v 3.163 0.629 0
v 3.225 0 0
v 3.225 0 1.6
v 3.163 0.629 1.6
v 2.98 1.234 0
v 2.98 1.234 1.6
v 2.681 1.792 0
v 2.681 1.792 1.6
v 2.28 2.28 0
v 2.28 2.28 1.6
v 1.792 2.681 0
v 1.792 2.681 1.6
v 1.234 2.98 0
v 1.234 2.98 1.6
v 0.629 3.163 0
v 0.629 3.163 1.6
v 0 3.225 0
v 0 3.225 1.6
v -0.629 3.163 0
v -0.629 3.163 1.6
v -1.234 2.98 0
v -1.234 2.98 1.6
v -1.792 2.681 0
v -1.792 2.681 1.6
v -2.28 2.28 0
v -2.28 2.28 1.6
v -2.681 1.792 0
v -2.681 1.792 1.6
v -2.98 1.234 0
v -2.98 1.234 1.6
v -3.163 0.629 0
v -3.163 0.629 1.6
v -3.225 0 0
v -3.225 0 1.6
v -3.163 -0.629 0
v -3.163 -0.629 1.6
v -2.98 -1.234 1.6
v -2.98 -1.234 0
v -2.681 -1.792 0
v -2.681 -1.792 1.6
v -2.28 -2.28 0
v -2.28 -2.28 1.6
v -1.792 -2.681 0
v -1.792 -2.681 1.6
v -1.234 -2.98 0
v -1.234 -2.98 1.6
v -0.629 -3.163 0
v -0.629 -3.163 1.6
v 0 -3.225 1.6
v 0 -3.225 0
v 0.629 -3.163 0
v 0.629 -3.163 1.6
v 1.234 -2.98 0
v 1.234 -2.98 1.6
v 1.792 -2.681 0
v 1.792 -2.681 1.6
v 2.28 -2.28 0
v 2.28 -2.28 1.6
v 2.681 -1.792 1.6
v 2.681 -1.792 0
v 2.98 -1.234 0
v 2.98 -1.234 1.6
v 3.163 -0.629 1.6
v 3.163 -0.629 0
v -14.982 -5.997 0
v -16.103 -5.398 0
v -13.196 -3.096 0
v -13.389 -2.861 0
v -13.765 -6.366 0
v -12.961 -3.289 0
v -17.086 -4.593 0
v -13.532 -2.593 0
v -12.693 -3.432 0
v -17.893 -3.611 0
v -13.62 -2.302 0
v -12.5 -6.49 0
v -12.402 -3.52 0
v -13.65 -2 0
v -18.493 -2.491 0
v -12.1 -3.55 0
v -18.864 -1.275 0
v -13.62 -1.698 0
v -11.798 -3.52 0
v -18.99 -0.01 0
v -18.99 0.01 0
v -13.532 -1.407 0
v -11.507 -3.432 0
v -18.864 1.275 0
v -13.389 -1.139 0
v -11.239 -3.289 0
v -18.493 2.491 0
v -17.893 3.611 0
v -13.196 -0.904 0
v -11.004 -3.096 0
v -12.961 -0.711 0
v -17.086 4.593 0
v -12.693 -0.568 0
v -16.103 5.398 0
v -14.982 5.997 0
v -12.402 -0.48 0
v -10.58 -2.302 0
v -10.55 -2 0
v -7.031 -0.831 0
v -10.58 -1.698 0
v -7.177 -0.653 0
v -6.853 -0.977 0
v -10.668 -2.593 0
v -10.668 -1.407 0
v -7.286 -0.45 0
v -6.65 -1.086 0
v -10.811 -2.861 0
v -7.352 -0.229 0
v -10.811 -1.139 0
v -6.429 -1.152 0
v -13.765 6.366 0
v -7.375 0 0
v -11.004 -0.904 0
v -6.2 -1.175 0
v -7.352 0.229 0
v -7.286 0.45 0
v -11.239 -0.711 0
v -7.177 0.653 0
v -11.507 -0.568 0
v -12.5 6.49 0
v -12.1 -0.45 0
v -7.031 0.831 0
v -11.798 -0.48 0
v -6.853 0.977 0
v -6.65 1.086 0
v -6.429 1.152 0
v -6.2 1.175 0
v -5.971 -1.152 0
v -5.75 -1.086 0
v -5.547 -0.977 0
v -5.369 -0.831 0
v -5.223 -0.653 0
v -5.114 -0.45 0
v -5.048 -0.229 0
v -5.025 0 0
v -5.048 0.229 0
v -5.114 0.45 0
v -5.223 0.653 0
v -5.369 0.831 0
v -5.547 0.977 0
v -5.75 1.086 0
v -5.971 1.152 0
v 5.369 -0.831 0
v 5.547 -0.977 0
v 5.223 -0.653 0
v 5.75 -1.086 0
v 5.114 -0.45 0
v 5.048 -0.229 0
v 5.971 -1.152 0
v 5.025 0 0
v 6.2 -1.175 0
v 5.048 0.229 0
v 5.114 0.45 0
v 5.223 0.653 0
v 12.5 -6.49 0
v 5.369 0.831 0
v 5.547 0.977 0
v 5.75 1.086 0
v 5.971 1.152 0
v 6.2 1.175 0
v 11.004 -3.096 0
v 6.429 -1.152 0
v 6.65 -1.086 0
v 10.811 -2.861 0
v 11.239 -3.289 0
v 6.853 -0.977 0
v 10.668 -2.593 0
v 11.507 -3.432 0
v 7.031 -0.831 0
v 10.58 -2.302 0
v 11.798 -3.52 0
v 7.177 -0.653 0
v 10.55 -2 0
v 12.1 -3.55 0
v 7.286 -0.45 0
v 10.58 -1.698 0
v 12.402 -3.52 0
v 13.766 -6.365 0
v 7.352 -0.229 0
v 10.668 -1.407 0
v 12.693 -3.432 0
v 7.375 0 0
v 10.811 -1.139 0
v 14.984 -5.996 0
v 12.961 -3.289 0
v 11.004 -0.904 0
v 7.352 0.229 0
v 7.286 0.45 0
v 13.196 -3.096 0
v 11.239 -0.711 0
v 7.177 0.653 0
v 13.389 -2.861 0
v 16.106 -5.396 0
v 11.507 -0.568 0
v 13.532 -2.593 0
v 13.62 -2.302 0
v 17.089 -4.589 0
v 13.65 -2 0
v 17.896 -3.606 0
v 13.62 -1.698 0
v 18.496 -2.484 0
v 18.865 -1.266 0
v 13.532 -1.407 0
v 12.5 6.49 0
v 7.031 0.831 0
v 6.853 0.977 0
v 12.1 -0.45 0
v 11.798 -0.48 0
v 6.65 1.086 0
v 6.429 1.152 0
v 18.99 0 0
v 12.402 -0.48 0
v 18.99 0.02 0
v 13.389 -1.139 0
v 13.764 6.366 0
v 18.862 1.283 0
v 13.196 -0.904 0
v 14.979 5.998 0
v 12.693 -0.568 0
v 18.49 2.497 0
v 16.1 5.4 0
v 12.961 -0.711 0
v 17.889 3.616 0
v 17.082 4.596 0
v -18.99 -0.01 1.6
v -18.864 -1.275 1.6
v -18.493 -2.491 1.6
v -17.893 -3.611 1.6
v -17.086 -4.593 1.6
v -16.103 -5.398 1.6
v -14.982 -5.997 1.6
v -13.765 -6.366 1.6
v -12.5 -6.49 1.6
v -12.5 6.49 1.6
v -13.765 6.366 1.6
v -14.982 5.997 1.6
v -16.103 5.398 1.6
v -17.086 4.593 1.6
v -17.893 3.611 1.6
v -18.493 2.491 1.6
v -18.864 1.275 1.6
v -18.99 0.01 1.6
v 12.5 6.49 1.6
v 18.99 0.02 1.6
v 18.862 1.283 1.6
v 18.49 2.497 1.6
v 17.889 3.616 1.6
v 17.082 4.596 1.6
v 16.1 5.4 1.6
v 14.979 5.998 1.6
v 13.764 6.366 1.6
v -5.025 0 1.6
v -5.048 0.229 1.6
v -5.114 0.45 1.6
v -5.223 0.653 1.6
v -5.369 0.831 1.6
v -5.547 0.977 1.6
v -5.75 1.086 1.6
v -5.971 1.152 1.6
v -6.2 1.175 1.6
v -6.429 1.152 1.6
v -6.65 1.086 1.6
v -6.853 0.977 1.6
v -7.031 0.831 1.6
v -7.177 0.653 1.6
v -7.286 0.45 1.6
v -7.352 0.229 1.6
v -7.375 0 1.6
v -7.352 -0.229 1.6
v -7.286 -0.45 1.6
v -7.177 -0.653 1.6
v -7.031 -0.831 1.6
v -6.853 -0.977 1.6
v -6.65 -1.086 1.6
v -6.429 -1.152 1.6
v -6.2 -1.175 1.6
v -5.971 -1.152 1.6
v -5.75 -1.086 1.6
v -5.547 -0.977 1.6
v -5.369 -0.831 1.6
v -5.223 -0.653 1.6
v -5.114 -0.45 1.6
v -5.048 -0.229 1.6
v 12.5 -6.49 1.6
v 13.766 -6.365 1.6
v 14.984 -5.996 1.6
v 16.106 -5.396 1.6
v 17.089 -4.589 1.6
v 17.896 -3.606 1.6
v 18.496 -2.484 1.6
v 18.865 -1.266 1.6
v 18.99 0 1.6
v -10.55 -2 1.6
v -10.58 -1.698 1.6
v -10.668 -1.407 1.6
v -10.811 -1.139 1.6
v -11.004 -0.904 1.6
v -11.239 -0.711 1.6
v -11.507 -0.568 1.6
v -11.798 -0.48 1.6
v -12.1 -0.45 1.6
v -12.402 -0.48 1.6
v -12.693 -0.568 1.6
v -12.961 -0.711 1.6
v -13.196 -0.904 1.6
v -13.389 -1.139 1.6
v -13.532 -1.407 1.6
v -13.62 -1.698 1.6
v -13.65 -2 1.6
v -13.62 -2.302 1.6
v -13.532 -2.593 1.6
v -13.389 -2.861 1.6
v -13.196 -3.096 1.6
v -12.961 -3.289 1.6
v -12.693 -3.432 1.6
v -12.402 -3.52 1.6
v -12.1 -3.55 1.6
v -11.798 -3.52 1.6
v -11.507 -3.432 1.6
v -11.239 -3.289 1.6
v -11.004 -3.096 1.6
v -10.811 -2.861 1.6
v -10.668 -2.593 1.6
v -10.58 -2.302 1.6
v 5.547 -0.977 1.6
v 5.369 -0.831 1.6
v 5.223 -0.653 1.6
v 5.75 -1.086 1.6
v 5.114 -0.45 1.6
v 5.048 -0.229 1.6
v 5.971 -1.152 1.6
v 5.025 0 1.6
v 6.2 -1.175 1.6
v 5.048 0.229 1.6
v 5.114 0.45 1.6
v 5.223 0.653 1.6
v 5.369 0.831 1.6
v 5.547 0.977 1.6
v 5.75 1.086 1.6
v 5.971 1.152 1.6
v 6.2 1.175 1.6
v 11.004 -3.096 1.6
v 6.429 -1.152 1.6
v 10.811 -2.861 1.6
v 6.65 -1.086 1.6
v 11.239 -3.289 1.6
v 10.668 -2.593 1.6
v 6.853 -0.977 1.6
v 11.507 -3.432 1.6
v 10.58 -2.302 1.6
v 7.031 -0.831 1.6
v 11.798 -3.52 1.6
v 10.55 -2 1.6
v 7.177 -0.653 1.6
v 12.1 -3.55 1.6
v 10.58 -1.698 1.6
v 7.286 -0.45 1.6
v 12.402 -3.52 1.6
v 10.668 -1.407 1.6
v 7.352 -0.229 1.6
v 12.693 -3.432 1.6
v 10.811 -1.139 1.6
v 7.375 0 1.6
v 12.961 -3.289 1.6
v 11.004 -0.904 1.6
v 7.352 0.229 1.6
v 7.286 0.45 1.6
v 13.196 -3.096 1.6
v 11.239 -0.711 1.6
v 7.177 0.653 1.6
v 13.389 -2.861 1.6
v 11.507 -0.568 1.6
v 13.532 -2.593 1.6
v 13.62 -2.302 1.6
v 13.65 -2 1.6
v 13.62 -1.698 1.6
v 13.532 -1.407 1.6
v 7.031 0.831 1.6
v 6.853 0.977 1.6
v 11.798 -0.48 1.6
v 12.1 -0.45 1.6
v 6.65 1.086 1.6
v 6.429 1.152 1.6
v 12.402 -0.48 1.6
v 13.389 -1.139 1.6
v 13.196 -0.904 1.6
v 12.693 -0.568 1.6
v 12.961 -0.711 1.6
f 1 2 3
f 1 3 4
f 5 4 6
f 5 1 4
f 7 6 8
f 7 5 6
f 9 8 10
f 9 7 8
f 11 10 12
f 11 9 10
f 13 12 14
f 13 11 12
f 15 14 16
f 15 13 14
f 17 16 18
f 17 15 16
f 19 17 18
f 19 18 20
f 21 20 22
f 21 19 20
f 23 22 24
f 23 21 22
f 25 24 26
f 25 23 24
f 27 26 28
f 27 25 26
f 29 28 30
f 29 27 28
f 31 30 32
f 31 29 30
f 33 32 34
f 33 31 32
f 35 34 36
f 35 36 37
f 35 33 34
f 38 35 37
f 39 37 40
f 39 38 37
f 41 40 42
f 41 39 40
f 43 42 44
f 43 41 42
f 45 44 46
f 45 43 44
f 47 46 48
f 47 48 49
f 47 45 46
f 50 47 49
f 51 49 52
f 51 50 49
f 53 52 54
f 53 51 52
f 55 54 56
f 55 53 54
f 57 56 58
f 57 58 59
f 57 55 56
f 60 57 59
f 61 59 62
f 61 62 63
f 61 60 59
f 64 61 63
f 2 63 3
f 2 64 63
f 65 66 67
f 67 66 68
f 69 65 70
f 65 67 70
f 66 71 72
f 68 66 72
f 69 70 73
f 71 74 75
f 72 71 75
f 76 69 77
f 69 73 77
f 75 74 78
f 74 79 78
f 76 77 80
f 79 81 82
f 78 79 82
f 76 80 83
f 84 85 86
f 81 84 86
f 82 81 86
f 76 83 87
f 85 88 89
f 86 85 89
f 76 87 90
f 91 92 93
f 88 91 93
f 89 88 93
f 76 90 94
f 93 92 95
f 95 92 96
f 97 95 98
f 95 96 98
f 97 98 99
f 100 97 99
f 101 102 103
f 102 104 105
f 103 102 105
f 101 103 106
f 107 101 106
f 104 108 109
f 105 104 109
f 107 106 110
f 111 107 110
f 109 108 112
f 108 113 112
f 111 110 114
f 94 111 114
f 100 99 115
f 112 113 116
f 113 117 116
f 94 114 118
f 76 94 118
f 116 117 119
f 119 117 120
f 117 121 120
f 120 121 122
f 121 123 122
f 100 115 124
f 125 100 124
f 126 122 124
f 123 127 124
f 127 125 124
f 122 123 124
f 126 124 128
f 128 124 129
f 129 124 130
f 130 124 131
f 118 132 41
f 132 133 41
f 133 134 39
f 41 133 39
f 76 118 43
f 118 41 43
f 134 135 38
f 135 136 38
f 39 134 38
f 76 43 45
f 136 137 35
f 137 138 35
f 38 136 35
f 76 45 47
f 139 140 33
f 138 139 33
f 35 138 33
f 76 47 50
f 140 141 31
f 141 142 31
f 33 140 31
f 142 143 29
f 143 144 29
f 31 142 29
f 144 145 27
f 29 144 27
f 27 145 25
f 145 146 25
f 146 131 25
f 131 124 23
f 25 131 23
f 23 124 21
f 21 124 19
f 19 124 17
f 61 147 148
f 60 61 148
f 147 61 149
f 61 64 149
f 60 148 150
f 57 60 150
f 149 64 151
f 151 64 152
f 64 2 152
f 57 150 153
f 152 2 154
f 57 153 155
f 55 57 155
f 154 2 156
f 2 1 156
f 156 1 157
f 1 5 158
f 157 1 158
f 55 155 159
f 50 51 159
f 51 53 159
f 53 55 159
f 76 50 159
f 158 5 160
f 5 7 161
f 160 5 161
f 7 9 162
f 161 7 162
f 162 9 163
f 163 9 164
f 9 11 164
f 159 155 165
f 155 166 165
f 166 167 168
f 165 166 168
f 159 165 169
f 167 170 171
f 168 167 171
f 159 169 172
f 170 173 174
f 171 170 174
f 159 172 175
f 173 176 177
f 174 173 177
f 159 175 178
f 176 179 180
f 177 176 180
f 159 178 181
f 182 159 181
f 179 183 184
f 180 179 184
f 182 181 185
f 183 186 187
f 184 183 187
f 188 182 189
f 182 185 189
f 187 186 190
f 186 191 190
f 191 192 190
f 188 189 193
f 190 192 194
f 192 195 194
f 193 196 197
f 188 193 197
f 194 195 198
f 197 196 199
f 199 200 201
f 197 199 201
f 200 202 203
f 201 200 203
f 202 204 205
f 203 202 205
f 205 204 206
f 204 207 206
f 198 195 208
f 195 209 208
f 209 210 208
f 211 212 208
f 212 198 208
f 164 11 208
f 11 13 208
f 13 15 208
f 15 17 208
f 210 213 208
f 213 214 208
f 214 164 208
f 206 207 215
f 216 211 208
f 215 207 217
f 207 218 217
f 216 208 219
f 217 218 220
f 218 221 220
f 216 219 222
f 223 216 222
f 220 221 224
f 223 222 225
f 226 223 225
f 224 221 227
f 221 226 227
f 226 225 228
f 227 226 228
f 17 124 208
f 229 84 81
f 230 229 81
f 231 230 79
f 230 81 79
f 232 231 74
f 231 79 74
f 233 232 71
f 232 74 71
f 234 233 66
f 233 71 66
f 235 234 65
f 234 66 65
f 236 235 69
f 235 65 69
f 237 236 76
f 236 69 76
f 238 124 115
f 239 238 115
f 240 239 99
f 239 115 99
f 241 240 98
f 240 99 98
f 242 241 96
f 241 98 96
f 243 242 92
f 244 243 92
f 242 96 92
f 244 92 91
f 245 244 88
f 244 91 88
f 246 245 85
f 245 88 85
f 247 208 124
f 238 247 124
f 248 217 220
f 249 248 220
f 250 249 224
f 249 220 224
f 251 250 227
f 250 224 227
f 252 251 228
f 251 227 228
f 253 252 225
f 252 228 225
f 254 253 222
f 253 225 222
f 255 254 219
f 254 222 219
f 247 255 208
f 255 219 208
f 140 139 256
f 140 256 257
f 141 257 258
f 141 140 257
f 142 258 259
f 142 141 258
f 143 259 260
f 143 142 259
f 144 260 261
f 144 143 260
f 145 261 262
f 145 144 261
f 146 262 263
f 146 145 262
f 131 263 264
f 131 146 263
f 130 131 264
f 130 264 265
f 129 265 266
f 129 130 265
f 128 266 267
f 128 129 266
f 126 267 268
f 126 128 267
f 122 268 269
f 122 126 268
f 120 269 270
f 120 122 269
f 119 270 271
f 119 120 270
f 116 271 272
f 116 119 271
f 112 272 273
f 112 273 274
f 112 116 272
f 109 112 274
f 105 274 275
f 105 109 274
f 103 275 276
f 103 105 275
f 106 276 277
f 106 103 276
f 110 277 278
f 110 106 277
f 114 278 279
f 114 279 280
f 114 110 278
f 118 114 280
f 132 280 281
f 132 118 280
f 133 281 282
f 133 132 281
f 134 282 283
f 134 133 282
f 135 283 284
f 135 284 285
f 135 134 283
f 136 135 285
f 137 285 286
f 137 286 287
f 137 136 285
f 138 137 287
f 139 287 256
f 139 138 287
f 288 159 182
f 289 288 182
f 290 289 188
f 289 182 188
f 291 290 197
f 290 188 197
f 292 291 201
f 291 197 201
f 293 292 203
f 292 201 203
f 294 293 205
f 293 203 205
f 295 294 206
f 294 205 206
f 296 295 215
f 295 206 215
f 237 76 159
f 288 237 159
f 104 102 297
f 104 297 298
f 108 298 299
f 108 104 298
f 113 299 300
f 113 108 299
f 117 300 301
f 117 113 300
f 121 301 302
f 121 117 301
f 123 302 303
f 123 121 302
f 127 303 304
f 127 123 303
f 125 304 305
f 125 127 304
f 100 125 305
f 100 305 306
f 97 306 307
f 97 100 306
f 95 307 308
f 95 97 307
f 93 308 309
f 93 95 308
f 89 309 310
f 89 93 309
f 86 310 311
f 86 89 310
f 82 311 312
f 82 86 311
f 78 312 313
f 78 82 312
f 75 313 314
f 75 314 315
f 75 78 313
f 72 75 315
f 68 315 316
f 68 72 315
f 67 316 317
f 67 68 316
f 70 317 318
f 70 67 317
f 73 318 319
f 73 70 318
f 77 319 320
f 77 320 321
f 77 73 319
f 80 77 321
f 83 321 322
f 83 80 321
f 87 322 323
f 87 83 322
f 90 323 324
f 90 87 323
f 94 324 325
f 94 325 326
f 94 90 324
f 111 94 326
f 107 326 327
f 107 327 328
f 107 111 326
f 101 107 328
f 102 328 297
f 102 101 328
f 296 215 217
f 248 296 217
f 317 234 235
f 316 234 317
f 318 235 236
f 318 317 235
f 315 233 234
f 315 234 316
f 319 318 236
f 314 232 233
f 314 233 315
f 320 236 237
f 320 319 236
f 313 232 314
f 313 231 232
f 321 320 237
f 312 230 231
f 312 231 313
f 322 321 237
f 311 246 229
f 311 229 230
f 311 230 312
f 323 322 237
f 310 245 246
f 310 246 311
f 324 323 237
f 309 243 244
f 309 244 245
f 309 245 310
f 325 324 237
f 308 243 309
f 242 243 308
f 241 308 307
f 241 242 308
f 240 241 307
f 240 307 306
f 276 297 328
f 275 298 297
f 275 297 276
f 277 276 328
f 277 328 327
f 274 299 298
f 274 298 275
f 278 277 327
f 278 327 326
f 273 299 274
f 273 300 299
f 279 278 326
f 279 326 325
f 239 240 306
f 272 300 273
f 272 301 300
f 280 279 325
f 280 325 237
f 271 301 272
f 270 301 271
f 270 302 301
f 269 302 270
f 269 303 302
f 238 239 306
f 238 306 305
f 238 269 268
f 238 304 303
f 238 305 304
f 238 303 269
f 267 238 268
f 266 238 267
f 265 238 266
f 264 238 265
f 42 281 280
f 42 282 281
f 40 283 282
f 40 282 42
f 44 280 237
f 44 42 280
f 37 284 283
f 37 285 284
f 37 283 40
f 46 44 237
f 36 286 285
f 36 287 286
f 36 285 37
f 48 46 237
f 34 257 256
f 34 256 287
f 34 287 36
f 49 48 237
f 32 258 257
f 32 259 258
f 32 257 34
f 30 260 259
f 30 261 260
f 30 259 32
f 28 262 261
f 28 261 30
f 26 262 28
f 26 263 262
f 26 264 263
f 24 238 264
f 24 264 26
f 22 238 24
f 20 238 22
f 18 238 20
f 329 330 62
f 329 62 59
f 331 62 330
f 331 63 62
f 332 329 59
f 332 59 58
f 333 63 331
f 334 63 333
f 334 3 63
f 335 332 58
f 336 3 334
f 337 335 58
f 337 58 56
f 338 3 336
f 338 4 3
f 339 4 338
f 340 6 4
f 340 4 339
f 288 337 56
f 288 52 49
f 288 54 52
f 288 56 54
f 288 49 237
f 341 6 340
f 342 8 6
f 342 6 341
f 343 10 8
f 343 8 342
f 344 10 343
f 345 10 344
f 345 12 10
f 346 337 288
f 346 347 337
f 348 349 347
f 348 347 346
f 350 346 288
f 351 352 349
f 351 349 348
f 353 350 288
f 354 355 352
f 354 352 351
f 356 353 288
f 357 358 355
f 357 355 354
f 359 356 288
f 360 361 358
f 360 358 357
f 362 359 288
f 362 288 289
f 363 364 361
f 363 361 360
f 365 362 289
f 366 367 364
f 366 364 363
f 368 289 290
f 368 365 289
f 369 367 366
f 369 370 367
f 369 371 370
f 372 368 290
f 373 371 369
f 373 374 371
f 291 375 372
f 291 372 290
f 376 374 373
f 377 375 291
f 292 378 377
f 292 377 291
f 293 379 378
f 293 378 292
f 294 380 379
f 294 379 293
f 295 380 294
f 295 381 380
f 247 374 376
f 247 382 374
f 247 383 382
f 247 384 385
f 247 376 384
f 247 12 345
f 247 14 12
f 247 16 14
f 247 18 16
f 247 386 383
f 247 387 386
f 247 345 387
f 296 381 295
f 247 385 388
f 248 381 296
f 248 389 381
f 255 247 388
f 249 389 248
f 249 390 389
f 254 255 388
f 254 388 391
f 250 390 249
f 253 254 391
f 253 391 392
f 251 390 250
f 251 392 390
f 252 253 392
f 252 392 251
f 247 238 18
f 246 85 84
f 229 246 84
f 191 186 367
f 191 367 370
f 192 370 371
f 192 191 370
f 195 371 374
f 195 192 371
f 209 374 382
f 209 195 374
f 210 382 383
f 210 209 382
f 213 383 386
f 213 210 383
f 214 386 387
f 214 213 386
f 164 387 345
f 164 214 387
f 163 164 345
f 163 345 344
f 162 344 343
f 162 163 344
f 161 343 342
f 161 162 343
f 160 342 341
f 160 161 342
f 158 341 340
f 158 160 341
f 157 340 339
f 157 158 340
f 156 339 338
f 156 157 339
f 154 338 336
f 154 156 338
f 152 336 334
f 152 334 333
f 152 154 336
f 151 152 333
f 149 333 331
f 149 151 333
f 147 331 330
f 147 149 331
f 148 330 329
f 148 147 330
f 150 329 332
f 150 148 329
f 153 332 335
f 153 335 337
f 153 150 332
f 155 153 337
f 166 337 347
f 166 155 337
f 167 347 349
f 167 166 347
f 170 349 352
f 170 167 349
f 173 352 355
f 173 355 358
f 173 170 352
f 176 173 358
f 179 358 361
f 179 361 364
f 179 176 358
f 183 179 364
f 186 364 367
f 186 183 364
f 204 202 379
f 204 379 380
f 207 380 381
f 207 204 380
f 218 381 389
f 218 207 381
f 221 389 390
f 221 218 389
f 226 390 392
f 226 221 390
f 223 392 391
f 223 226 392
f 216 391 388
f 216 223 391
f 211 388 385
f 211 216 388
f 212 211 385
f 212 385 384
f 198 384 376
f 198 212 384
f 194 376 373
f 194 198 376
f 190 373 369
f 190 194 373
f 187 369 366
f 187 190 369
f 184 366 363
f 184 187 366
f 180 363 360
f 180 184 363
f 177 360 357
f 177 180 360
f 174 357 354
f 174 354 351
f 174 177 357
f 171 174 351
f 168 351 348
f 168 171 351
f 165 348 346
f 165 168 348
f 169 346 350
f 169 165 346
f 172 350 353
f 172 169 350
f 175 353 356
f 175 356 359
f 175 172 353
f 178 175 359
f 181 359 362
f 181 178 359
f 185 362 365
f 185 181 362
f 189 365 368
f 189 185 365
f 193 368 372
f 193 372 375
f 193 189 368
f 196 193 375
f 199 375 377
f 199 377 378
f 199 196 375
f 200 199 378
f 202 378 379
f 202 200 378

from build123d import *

# Parameters (mm, degrees)
MODEL_R                 = 1.55
MODEL_R_2               = 1.175
MODEL_R_3               = 3.225
SALIENTE_EXTRUIR1_DEPTH = 1.6


with BuildPart() as part:
    # Model → Saliente-Extruir1 (new body)
    with BuildSketch(Plane.XY):
        with BuildLine():
            Line((18.99, -0.000135429), (18.99, 0.019864571))
            ThreePointArc((18.99, 0.019864571), (17.082224275, 4.596089282), (12.5003, 6.490135416))
            ThreePointArc((12.5003, 6.490135429), (12.5, 6.489835429), (12.4997, 6.490135429))
            Line((12.4997, 6.490135429), (0, 6.490135429))
            Line((0, 6.490135429), (-12.4997, 6.490135429))
            ThreePointArc((-12.4997, 6.490135429), (-12.499999997, 6.489835429), (-12.5003, 6.490135422))
            ThreePointArc((-12.5003, 6.490135422), (-17.085798512, 4.592642615), (-18.990142559, 0.009985166))
            Line((-18.990142559, 0.009985166), (-18.990142559, -0.010014834))
            ThreePointArc((-18.990142559, -0.010014834), (-17.085798512, -4.592672284), (-12.5003, -6.490165091))
            ThreePointArc((-12.5003, -6.490165091), (-12.499999997, -6.489865098), (-12.4997, -6.490165098))
            Line((-12.4997, -6.490165098), (12.4997, -6.490135429))
            ThreePointArc((12.4997, -6.490135429), (12.5, -6.489835429), (12.5003, -6.490135429))
            ThreePointArc((12.5003, -6.490135415), (17.089185065, -4.589108362), (18.99, -0.000135429))
        make_face()
        with Locations((-12.1, -2)):
            Circle(MODEL_R, mode=Mode.SUBTRACT)
        with Locations((12.1, -2)):
            Circle(MODEL_R, mode=Mode.SUBTRACT)
        with Locations((-6.2, 0)):
            Circle(MODEL_R_2, mode=Mode.SUBTRACT)
        Circle(MODEL_R_3, mode=Mode.SUBTRACT)
        with Locations((6.2, 0)):
            Circle(MODEL_R_2, mode=Mode.SUBTRACT)
    extrude(amount=SALIENTE_EXTRUIR1_DEPTH)


solid = part.part
